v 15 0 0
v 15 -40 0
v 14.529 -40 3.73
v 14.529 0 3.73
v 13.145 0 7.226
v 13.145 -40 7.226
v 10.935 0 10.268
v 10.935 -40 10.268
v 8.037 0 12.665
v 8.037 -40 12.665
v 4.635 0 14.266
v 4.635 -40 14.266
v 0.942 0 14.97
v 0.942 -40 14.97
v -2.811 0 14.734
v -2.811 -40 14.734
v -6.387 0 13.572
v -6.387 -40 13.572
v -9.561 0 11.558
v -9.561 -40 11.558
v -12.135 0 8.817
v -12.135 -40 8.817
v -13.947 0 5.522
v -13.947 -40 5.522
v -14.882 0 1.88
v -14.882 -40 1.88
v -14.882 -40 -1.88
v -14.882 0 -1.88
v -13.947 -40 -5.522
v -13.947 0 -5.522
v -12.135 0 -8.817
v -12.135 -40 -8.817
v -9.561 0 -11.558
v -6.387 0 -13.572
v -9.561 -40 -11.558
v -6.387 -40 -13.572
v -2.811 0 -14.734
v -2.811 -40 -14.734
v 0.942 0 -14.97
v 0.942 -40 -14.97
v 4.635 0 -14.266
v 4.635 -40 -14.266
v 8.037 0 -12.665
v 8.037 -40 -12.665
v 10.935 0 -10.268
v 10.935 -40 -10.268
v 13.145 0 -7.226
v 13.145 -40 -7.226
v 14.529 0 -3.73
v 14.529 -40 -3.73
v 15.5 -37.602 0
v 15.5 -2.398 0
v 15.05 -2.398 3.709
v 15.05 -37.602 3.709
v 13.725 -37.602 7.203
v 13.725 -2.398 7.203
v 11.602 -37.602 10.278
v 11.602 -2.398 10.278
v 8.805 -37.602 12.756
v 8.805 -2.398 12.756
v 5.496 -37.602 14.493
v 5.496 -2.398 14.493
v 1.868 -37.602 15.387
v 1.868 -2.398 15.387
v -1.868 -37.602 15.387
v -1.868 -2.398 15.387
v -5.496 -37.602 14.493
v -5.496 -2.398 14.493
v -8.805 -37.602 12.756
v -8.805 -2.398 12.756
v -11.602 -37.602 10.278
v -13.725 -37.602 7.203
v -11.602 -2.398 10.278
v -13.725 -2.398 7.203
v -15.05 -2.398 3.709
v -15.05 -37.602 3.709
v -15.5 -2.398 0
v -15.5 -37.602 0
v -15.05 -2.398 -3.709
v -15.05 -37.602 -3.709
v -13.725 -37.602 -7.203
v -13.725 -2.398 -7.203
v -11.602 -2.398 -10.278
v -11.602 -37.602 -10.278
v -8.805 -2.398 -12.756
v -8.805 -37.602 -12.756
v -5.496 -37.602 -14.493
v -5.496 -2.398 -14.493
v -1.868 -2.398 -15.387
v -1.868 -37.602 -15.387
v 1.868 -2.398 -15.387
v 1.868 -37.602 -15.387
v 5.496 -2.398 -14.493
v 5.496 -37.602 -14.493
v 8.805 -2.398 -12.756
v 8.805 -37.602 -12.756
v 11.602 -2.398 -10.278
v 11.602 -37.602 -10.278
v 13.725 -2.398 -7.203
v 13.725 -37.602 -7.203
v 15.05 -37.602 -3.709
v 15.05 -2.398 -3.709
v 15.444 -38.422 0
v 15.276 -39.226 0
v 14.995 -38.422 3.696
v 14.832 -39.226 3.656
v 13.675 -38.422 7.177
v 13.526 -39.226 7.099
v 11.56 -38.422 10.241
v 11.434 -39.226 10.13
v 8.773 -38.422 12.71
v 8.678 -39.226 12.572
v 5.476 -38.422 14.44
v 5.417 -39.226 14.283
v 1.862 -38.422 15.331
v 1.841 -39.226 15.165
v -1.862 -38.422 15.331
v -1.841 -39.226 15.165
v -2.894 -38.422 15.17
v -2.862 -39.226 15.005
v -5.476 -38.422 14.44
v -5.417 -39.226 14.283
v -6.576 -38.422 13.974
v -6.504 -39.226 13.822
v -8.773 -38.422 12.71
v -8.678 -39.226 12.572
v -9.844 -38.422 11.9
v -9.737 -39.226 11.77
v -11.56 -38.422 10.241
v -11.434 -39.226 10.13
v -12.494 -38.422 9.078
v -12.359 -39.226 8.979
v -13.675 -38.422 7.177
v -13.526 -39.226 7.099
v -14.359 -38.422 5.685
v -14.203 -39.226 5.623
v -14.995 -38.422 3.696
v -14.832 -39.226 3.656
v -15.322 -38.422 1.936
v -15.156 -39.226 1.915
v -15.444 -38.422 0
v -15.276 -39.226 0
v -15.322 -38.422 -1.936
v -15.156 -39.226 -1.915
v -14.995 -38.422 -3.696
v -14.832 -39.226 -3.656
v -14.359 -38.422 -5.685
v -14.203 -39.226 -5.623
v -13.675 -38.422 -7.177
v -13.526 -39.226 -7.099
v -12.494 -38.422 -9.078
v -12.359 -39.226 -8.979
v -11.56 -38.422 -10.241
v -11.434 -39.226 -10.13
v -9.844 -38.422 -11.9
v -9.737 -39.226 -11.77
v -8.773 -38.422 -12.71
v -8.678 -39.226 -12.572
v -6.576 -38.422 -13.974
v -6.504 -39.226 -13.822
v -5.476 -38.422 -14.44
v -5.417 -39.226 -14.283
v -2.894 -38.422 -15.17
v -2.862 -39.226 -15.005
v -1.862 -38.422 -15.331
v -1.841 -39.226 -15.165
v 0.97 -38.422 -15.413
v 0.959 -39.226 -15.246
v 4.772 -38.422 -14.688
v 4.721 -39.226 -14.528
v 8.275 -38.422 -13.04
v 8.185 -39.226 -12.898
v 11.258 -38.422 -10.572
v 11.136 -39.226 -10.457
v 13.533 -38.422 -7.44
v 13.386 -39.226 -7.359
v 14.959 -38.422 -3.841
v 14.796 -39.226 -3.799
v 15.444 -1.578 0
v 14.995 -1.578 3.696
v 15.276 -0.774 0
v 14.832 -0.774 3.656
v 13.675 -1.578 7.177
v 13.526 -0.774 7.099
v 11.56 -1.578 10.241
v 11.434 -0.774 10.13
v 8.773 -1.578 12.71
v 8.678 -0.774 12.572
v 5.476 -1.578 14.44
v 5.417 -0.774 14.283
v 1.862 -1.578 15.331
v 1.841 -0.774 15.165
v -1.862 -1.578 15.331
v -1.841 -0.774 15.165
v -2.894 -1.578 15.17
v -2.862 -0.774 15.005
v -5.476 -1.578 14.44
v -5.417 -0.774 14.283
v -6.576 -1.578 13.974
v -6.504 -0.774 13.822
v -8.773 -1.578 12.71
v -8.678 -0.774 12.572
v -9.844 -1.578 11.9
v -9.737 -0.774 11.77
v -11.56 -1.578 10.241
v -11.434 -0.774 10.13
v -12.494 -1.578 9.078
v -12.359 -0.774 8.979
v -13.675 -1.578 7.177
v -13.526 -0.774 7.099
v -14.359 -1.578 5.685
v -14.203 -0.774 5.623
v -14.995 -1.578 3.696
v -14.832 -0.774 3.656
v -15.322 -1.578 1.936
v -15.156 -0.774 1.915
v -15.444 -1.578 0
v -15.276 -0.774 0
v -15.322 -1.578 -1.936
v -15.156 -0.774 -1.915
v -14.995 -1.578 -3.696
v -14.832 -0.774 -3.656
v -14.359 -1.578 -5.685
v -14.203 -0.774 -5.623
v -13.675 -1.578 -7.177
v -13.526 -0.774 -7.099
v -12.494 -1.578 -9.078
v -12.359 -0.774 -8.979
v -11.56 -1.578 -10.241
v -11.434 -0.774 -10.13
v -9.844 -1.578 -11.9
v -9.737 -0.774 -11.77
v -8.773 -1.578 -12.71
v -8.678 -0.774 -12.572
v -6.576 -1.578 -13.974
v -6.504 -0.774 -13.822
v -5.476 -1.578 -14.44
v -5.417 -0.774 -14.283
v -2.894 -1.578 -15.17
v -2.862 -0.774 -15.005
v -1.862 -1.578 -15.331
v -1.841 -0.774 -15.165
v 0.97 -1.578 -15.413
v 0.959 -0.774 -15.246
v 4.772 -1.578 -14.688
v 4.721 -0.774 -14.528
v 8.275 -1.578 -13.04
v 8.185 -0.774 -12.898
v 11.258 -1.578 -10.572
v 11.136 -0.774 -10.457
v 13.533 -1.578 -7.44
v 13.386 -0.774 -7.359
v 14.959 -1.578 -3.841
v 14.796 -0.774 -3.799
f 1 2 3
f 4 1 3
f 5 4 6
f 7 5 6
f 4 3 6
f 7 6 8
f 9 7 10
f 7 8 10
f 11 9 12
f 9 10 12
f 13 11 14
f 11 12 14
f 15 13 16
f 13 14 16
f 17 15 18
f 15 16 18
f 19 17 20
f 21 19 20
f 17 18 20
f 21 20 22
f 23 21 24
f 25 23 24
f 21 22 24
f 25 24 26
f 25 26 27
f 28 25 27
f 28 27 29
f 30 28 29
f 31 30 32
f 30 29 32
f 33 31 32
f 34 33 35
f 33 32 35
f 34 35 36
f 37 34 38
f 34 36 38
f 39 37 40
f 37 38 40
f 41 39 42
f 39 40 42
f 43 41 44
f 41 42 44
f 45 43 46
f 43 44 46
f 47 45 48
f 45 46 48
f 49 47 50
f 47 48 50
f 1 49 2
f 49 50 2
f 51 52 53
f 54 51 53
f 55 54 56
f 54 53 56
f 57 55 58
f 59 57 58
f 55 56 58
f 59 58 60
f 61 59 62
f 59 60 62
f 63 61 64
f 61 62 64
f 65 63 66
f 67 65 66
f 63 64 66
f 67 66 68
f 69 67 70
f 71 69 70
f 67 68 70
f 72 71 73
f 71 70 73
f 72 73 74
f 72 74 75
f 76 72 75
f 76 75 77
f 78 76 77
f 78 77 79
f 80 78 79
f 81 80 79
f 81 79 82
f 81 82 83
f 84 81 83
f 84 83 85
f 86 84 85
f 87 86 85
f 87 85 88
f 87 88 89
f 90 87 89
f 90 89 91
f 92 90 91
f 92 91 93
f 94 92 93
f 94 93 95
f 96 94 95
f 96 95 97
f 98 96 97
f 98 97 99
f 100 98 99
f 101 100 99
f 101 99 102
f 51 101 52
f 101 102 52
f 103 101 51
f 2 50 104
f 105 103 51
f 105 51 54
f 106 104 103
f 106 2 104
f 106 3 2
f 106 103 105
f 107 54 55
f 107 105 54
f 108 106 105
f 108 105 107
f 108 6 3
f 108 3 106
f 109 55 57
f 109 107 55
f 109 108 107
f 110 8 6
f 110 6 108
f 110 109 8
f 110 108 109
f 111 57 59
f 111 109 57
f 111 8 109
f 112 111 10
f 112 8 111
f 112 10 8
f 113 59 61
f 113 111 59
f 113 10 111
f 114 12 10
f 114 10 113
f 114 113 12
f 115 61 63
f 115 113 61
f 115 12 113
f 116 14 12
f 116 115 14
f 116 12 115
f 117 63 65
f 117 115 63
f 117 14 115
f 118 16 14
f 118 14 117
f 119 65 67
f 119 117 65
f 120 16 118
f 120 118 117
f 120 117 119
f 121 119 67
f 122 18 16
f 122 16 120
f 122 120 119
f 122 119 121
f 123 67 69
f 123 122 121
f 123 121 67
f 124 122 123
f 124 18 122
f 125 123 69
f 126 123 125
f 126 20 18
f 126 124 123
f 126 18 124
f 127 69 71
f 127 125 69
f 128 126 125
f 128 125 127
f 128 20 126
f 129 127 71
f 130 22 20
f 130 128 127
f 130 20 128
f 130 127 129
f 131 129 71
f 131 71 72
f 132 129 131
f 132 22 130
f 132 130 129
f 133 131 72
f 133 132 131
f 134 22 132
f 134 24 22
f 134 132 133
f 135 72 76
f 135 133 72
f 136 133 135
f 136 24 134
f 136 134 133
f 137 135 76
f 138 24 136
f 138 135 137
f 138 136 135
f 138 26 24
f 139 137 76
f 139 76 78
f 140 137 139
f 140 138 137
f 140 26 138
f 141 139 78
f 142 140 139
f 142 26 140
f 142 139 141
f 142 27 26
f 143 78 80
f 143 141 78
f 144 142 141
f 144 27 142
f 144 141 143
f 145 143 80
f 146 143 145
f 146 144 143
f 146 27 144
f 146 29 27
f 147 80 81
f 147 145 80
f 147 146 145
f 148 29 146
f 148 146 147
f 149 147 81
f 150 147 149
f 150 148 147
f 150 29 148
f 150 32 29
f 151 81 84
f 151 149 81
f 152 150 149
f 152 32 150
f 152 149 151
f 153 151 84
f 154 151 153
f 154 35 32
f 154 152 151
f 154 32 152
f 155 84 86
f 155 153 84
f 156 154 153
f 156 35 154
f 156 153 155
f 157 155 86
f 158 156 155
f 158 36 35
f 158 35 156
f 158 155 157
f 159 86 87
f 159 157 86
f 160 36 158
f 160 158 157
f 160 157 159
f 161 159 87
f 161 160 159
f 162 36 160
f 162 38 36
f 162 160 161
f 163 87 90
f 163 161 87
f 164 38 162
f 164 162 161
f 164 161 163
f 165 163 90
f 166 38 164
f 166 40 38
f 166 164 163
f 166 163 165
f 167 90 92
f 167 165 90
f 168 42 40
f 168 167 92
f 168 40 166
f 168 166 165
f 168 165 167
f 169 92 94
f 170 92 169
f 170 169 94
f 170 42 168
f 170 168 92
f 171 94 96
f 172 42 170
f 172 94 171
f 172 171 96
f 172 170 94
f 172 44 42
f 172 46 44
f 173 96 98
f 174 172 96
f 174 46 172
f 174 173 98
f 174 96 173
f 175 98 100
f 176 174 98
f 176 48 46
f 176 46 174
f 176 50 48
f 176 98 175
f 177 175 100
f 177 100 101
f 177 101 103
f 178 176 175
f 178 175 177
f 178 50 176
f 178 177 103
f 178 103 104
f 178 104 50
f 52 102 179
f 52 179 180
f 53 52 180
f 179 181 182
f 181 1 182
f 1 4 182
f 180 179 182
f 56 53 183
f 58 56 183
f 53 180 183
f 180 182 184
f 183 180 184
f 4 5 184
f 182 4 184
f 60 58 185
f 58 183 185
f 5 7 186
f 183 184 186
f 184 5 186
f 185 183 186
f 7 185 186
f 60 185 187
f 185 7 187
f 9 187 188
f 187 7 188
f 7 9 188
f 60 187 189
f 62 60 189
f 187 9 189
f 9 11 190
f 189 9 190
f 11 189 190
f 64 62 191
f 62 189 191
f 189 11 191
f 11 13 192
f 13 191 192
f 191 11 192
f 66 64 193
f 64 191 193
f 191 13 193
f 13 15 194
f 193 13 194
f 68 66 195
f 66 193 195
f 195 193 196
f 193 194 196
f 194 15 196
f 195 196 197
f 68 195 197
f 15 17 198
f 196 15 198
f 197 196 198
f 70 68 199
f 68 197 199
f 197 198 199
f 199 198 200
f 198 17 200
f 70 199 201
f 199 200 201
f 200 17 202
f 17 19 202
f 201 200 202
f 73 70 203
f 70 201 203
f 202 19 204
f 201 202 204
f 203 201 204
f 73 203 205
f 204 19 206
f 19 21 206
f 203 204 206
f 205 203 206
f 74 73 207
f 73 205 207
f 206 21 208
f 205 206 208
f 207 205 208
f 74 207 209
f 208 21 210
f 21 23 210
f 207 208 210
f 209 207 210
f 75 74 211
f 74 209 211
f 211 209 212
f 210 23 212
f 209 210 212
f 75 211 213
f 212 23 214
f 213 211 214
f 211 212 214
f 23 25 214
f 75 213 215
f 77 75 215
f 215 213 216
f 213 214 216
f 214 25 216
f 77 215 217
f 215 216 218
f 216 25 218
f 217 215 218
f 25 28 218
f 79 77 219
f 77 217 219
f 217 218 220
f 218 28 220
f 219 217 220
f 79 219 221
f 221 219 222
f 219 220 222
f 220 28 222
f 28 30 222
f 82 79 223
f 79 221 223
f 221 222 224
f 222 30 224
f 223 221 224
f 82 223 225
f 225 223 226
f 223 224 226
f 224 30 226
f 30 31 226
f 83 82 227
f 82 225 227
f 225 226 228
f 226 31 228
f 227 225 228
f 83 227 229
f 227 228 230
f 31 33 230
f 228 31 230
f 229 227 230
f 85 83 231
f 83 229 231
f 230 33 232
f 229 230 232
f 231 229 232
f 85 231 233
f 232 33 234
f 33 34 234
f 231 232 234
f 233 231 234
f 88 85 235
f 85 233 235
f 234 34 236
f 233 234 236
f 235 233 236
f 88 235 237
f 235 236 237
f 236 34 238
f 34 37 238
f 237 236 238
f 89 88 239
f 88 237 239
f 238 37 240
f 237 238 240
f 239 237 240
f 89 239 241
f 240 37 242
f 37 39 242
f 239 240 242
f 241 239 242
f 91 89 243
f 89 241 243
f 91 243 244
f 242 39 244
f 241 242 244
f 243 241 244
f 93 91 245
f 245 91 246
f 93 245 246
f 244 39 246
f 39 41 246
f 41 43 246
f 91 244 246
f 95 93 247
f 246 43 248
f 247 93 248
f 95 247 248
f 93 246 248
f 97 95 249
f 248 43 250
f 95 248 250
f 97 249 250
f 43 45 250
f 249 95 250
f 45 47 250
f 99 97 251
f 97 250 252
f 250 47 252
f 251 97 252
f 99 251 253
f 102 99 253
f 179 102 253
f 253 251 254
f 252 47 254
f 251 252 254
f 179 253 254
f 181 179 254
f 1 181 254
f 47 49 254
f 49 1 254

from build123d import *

# Parameters (mm, degrees)
F0_R     = 15.5
F1_DEPTH = 40
F2_R     = 15
F3_DEPTH = 40


# Not quite as in the source:
# - a fillet or chamfer that OpenCascade refuses, or shapes differently, is made with other operations: its cross-section is extruded or revolved along the edge and cut away or added


with BuildPart() as f1:
    # F0 (on Front) → F1 (new body)
    with BuildSketch(Plane.XZ):
        Circle(F0_R)
    extrude(amount=F1_DEPTH)

    # F2 (on face) → F3 (cut)
    with BuildSketch(Plane.XZ.offset(40)):
        Circle(F2_R)
    extrude(amount=-F3_DEPTH, mode=Mode.SUBTRACT)

    # F4: fillet of radius 6 on 1 edges, made by hand

    # F4_s1 → F4_t2 (revolve, cut)
    with BuildSketch(Plane.XY):
        with BuildLine():
            ThreePointArc((15.5, -37.6020842383), (15.3736700622, -38.8268291097), (15, -40))
            Line((15, -40), (15.5, -40))
            Line((15.5, -40), (15.5, -37.6020842383))
        make_face()
    revolve(axis=Axis((0, -40, 0), (0, -1, 0)), mode=Mode.SUBTRACT)

    # F5: fillet of radius 6 on 1 edges, made by hand

    # F5_s1 → F5_t2 (revolve, cut)
    with BuildSketch(Plane.XY):
        with BuildLine():
            ThreePointArc((15.5, -2.3979157617), (15.3736700622, -1.1731708903), (15, 0))
            Line((15, 0), (15.5, 0))
            Line((15.5, 0), (15.5, -2.3979157617))
        make_face()
    revolve(axis=Axis((0, 0, 0), (0, -1, 0)), mode=Mode.SUBTRACT)


solid = f1.part
